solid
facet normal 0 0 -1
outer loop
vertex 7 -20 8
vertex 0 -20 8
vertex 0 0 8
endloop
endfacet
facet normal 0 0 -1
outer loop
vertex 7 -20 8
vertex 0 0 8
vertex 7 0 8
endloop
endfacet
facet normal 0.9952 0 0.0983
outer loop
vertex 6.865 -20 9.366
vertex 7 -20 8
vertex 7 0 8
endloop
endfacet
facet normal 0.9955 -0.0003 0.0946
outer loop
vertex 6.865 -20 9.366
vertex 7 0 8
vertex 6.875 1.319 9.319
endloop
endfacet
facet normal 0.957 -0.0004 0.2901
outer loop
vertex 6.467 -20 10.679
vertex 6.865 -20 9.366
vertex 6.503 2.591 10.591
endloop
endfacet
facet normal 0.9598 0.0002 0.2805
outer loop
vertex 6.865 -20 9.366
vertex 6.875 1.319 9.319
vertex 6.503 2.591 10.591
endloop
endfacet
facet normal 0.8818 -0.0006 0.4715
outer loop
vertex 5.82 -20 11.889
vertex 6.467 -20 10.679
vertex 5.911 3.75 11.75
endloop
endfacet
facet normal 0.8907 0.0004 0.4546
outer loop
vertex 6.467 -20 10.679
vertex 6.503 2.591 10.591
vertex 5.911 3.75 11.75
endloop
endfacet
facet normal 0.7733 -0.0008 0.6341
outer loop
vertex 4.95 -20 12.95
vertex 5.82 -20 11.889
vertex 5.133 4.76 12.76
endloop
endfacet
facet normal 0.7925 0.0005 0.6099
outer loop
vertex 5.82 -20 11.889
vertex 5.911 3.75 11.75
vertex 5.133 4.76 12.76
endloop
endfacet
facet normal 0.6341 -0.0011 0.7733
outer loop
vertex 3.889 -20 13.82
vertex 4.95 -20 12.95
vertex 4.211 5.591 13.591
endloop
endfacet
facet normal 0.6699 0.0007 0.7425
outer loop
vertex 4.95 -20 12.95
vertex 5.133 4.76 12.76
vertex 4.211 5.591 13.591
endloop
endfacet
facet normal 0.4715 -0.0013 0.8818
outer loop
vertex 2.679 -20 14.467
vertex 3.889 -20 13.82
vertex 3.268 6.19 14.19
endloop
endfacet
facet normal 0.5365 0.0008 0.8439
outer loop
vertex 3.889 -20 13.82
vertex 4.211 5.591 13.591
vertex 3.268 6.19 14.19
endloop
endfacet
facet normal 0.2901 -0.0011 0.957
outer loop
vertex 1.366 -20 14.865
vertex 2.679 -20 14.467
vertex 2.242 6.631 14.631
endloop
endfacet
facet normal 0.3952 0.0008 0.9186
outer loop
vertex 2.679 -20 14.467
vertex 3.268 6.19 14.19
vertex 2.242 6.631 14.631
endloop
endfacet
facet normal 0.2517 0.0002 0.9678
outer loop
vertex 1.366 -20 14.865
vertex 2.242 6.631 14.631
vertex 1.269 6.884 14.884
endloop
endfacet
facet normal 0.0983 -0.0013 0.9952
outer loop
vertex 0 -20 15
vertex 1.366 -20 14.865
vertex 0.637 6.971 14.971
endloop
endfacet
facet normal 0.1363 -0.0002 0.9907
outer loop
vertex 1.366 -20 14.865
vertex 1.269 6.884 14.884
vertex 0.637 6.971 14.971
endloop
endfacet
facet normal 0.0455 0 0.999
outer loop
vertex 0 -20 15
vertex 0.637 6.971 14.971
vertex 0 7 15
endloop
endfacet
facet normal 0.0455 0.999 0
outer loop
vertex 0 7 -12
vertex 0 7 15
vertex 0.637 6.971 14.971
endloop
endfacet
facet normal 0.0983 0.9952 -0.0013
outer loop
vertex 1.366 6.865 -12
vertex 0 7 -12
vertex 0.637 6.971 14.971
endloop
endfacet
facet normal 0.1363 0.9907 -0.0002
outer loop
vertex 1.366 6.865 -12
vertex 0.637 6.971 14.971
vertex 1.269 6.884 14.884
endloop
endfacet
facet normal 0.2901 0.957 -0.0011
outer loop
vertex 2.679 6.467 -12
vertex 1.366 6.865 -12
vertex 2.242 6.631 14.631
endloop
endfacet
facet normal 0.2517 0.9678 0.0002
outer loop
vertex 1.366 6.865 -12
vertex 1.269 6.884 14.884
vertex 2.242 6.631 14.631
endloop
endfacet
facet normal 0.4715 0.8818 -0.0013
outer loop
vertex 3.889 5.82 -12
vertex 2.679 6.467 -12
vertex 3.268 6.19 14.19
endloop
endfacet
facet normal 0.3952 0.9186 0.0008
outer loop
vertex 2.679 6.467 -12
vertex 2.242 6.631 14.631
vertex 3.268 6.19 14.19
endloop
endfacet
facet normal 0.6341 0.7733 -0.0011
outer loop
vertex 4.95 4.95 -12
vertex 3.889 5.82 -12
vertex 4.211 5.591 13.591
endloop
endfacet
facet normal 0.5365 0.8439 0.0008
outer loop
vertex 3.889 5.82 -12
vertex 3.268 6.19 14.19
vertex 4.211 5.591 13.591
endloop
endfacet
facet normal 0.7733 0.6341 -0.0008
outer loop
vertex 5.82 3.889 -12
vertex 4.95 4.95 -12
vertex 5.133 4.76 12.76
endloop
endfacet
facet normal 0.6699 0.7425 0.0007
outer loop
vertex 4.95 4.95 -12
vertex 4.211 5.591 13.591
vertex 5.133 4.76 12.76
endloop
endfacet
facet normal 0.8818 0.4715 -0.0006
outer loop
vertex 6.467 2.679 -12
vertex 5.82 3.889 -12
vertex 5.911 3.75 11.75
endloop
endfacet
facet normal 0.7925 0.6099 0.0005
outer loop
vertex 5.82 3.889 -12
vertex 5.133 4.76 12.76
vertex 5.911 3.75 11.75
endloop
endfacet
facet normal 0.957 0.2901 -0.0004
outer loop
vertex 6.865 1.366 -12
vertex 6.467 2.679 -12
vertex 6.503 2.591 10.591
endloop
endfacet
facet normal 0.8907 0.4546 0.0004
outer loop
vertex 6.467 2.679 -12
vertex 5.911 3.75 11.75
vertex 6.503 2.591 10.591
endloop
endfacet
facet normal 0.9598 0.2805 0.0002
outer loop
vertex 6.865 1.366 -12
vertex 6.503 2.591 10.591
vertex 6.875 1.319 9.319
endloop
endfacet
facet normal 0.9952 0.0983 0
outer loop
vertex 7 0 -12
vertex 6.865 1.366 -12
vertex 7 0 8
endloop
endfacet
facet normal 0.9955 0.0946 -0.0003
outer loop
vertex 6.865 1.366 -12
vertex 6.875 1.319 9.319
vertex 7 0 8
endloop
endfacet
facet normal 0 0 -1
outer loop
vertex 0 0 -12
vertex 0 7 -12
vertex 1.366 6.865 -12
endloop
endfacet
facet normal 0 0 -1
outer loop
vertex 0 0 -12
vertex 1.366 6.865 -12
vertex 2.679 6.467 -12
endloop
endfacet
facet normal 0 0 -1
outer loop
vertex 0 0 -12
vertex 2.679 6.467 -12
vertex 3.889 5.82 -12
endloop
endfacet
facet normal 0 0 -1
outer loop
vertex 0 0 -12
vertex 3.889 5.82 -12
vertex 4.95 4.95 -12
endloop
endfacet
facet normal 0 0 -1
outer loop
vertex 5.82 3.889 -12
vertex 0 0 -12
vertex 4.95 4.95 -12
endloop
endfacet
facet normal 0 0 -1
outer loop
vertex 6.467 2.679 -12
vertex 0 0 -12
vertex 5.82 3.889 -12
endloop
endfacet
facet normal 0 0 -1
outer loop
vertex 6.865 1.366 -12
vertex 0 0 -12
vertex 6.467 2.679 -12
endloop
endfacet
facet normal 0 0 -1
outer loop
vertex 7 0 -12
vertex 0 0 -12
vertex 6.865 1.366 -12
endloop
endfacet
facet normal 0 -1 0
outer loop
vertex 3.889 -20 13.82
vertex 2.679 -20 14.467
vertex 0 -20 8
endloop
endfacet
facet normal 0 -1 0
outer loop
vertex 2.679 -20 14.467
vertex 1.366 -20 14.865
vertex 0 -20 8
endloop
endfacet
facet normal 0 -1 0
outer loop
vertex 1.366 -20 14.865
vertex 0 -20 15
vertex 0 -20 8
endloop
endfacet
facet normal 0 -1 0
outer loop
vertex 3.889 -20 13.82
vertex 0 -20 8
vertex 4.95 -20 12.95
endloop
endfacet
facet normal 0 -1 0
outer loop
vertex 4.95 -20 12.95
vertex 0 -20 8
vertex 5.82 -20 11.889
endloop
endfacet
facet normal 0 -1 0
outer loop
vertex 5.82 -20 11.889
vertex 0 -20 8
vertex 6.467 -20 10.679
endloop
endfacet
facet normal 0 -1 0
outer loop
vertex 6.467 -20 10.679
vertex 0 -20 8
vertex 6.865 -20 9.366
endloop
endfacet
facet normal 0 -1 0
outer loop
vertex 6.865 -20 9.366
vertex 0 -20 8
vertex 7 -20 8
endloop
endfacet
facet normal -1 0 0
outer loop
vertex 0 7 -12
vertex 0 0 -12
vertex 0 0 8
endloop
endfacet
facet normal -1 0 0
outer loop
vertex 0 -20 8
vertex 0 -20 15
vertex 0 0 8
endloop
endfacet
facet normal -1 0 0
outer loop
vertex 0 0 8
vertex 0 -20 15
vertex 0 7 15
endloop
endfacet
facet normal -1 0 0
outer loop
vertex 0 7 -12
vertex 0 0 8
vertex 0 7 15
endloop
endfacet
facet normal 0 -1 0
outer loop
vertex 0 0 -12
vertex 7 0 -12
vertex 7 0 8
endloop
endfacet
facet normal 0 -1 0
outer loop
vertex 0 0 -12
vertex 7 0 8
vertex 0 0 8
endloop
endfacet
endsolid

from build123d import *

# Parameters (mm, degrees)
F1_DEPTH      = 15
F3_DEPTH      = 15
F3_DEPTH_BACK = 7
F6_DEPTH      = 20
F7_DEPTH      = 20


with BuildPart() as f1:
    # F0 (on Top) → F1 (new body)
    with BuildSketch(Plane.XY):
        with BuildLine():
            Line((0, 0), (7, 0))
            ThreePointArc((7, 0), (4.9497474683, 4.9497474683), (0, 7))
            Line((0, 7), (0, 0))
        make_face()
    extrude(amount=F1_DEPTH)


with BuildPart() as f3:
    # F2 (on face) → F3 (new body, two sides)
    with BuildSketch(Plane.XZ) as f3_sk:
        with BuildLine():
            ThreePointArc((7, 8), (4.9497474683, 12.9497474683), (0, 15))
            Line((0, 15), (0, 8))
            Line((0, 8), (7, 8))
        make_face()
    extrude(amount=F3_DEPTH)
    extrude(f3_sk.sketch, amount=-F3_DEPTH_BACK)

    # F4: intersect F1
    add(f1.part, mode=Mode.INTERSECT)

    # F6 (add): a face of the model
    f6_faces = [f3.faces().sort_by_distance(p)[0] for p in [
        (2.970892271, 0, 10.970892271),
    ]]
    extrude(f6_faces, amount=F6_DEPTH)

    # F5 (on face) → F7 (join)
    with BuildSketch(Plane(origin=(0, 0, 8), x_dir=(1, 0, 0), z_dir=(0, 0, -1))):
        with BuildLine():
            ThreePointArc((0, -7), (4.9497474683, -4.9497474683), (7, 0))
            Line((7, 0), (0, 0))
            Line((0, 0), (0, -7))
        make_face()
    extrude(amount=F7_DEPTH)


solid = f3.part
